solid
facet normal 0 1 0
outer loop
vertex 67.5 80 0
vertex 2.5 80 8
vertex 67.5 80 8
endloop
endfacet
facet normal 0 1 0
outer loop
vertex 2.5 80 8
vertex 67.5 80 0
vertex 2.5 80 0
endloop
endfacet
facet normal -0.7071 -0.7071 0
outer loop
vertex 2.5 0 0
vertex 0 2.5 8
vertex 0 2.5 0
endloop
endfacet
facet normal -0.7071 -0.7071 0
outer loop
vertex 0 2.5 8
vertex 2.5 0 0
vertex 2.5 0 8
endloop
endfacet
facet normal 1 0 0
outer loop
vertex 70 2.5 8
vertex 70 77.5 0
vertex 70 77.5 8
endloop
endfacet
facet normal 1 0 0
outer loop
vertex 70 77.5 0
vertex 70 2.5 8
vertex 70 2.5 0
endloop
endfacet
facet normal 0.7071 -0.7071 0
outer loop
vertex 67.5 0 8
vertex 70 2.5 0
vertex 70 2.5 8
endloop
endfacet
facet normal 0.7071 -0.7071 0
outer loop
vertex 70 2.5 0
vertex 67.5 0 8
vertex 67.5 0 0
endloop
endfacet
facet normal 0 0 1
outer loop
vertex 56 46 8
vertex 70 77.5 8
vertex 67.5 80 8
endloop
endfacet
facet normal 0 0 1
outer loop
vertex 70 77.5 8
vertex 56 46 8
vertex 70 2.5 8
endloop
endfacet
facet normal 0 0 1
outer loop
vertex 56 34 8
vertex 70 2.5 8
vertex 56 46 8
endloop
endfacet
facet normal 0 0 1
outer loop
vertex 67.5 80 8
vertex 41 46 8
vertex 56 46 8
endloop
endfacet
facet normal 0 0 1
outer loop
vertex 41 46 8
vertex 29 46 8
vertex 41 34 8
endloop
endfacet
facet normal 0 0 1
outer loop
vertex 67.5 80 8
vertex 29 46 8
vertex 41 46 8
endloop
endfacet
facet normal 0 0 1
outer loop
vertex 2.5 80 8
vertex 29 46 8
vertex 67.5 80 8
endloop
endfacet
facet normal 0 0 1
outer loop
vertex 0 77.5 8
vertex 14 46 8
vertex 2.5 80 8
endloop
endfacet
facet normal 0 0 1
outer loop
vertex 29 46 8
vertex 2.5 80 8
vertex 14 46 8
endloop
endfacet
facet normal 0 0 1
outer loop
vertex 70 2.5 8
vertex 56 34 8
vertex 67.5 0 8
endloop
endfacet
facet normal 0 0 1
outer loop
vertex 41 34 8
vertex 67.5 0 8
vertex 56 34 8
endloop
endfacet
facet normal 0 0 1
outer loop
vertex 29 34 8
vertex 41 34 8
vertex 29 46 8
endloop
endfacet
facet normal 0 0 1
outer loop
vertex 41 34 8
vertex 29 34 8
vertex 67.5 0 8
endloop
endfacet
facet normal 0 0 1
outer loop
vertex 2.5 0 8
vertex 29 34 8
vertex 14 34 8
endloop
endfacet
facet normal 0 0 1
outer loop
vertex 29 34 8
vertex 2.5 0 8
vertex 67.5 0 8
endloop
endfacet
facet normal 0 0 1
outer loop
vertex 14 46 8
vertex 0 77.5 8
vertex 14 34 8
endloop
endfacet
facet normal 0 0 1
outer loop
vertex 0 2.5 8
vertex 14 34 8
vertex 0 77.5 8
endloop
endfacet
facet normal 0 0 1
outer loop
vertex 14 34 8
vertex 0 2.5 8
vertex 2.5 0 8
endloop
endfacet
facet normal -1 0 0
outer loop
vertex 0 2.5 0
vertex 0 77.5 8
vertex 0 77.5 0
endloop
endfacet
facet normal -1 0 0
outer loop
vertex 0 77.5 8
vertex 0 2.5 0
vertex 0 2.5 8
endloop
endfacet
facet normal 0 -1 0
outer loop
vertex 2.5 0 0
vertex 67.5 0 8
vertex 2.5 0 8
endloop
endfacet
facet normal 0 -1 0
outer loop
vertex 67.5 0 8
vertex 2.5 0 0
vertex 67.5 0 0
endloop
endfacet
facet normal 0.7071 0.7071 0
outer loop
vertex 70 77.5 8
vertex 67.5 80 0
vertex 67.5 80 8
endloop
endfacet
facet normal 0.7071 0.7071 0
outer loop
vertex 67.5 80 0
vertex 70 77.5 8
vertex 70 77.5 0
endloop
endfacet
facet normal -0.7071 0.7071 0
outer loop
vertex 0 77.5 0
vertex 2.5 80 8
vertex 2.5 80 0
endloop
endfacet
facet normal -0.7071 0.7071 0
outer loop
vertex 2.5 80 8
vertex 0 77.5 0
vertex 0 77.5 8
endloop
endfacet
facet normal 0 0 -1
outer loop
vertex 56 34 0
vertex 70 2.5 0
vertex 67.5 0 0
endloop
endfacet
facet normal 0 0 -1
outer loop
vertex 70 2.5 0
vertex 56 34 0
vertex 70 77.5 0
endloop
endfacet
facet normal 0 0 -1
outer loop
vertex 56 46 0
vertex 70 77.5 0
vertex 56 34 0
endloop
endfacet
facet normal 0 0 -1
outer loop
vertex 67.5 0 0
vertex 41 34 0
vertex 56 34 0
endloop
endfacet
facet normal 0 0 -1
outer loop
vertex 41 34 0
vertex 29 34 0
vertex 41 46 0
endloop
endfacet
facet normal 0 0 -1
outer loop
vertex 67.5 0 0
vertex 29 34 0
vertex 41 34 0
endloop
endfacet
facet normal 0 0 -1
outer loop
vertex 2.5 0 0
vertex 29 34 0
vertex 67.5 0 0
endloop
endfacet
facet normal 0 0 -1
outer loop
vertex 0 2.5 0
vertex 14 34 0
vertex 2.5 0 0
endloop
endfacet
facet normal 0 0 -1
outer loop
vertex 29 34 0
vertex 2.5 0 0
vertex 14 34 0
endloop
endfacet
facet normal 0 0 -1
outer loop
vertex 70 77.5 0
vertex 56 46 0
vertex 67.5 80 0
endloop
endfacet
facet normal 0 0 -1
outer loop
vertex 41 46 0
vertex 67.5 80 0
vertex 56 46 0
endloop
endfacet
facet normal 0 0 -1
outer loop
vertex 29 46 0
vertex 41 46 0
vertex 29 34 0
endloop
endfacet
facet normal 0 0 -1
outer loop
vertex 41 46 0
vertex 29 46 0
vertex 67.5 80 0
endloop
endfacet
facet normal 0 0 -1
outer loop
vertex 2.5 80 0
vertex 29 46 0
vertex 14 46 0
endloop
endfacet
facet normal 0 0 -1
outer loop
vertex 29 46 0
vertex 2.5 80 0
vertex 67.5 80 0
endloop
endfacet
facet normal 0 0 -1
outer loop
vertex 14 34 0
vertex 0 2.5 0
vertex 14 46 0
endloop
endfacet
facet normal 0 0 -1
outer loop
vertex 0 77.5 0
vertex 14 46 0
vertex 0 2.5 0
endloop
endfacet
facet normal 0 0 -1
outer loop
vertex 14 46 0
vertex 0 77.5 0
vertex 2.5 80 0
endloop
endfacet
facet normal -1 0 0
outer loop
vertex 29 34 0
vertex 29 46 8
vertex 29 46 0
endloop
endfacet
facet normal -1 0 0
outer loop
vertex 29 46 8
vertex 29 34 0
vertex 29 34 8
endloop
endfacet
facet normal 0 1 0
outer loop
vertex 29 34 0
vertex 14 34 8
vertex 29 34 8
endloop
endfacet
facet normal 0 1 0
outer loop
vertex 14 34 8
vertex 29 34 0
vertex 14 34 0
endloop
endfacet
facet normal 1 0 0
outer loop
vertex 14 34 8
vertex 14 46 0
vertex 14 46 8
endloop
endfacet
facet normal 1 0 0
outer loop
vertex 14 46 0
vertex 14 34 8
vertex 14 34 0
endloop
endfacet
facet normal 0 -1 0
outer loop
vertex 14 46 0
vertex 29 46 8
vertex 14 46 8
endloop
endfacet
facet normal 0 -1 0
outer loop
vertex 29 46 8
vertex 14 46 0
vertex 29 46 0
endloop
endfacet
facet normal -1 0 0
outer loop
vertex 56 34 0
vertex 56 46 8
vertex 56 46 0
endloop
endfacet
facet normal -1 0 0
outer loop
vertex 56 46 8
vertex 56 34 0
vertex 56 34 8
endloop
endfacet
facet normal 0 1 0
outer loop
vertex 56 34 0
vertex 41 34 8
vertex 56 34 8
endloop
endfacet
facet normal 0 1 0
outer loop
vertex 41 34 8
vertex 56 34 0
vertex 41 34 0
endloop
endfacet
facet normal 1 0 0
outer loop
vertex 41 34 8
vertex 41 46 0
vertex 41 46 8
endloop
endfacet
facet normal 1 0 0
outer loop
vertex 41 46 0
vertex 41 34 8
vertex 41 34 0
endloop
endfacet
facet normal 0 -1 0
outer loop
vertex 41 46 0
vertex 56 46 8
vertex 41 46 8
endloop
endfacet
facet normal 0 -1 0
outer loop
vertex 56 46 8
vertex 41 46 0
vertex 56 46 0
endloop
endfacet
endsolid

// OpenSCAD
$fn = 32;

// ----------------------------------------------------------------------
// Windowed plate: 2 voids, 70 x 80 x 8 mm
// ----------------------------------------------------------------------

// --- parameters (mm) ---
plate_l = 70;             // plate length, X
plate_w = 80;             // plate width, Y
plate_t = 8;              // plate thickness, Z
edge_margin = 8;          // wall from the plate edge to any window
windows = 2;              // number of windows in the row
win_l = 15;               // window length
win_w = 12;               // window width
win_pitch = 27;           // window pitch along X
depth_1 = 8;              // depth of void 1 (full thickness = through)
depth_2 = 8;              // depth of void 2 (full thickness = through)
corner_c = 2.5;           // corner chamfer of the plate

profile = [[2.5, 0], [67.5, 0], [70, 2.5], [70, 77.5], [67.5, 80], [2.5, 80], [0, 77.5], [0, 2.5]];  // primary outline, 8 points, counter clockwise
void_1 = [[14, 34], [29, 34], [29, 46], [14, 46]];  // window 1 of the row, 4 points
void_2 = [[41, 34], [56, 34], [56, 46], [41, 46]];  // window 2 of the row, 4 points

// --- the one profile operation ---
difference() {
  linear_extrude(height = plate_t) polygon(points = profile);
  translate([0, 0, -1])
    linear_extrude(height = plate_t + 2) polygon(points = void_1);
  translate([0, 0, -1])
    linear_extrude(height = plate_t + 2) polygon(points = void_2);
}
